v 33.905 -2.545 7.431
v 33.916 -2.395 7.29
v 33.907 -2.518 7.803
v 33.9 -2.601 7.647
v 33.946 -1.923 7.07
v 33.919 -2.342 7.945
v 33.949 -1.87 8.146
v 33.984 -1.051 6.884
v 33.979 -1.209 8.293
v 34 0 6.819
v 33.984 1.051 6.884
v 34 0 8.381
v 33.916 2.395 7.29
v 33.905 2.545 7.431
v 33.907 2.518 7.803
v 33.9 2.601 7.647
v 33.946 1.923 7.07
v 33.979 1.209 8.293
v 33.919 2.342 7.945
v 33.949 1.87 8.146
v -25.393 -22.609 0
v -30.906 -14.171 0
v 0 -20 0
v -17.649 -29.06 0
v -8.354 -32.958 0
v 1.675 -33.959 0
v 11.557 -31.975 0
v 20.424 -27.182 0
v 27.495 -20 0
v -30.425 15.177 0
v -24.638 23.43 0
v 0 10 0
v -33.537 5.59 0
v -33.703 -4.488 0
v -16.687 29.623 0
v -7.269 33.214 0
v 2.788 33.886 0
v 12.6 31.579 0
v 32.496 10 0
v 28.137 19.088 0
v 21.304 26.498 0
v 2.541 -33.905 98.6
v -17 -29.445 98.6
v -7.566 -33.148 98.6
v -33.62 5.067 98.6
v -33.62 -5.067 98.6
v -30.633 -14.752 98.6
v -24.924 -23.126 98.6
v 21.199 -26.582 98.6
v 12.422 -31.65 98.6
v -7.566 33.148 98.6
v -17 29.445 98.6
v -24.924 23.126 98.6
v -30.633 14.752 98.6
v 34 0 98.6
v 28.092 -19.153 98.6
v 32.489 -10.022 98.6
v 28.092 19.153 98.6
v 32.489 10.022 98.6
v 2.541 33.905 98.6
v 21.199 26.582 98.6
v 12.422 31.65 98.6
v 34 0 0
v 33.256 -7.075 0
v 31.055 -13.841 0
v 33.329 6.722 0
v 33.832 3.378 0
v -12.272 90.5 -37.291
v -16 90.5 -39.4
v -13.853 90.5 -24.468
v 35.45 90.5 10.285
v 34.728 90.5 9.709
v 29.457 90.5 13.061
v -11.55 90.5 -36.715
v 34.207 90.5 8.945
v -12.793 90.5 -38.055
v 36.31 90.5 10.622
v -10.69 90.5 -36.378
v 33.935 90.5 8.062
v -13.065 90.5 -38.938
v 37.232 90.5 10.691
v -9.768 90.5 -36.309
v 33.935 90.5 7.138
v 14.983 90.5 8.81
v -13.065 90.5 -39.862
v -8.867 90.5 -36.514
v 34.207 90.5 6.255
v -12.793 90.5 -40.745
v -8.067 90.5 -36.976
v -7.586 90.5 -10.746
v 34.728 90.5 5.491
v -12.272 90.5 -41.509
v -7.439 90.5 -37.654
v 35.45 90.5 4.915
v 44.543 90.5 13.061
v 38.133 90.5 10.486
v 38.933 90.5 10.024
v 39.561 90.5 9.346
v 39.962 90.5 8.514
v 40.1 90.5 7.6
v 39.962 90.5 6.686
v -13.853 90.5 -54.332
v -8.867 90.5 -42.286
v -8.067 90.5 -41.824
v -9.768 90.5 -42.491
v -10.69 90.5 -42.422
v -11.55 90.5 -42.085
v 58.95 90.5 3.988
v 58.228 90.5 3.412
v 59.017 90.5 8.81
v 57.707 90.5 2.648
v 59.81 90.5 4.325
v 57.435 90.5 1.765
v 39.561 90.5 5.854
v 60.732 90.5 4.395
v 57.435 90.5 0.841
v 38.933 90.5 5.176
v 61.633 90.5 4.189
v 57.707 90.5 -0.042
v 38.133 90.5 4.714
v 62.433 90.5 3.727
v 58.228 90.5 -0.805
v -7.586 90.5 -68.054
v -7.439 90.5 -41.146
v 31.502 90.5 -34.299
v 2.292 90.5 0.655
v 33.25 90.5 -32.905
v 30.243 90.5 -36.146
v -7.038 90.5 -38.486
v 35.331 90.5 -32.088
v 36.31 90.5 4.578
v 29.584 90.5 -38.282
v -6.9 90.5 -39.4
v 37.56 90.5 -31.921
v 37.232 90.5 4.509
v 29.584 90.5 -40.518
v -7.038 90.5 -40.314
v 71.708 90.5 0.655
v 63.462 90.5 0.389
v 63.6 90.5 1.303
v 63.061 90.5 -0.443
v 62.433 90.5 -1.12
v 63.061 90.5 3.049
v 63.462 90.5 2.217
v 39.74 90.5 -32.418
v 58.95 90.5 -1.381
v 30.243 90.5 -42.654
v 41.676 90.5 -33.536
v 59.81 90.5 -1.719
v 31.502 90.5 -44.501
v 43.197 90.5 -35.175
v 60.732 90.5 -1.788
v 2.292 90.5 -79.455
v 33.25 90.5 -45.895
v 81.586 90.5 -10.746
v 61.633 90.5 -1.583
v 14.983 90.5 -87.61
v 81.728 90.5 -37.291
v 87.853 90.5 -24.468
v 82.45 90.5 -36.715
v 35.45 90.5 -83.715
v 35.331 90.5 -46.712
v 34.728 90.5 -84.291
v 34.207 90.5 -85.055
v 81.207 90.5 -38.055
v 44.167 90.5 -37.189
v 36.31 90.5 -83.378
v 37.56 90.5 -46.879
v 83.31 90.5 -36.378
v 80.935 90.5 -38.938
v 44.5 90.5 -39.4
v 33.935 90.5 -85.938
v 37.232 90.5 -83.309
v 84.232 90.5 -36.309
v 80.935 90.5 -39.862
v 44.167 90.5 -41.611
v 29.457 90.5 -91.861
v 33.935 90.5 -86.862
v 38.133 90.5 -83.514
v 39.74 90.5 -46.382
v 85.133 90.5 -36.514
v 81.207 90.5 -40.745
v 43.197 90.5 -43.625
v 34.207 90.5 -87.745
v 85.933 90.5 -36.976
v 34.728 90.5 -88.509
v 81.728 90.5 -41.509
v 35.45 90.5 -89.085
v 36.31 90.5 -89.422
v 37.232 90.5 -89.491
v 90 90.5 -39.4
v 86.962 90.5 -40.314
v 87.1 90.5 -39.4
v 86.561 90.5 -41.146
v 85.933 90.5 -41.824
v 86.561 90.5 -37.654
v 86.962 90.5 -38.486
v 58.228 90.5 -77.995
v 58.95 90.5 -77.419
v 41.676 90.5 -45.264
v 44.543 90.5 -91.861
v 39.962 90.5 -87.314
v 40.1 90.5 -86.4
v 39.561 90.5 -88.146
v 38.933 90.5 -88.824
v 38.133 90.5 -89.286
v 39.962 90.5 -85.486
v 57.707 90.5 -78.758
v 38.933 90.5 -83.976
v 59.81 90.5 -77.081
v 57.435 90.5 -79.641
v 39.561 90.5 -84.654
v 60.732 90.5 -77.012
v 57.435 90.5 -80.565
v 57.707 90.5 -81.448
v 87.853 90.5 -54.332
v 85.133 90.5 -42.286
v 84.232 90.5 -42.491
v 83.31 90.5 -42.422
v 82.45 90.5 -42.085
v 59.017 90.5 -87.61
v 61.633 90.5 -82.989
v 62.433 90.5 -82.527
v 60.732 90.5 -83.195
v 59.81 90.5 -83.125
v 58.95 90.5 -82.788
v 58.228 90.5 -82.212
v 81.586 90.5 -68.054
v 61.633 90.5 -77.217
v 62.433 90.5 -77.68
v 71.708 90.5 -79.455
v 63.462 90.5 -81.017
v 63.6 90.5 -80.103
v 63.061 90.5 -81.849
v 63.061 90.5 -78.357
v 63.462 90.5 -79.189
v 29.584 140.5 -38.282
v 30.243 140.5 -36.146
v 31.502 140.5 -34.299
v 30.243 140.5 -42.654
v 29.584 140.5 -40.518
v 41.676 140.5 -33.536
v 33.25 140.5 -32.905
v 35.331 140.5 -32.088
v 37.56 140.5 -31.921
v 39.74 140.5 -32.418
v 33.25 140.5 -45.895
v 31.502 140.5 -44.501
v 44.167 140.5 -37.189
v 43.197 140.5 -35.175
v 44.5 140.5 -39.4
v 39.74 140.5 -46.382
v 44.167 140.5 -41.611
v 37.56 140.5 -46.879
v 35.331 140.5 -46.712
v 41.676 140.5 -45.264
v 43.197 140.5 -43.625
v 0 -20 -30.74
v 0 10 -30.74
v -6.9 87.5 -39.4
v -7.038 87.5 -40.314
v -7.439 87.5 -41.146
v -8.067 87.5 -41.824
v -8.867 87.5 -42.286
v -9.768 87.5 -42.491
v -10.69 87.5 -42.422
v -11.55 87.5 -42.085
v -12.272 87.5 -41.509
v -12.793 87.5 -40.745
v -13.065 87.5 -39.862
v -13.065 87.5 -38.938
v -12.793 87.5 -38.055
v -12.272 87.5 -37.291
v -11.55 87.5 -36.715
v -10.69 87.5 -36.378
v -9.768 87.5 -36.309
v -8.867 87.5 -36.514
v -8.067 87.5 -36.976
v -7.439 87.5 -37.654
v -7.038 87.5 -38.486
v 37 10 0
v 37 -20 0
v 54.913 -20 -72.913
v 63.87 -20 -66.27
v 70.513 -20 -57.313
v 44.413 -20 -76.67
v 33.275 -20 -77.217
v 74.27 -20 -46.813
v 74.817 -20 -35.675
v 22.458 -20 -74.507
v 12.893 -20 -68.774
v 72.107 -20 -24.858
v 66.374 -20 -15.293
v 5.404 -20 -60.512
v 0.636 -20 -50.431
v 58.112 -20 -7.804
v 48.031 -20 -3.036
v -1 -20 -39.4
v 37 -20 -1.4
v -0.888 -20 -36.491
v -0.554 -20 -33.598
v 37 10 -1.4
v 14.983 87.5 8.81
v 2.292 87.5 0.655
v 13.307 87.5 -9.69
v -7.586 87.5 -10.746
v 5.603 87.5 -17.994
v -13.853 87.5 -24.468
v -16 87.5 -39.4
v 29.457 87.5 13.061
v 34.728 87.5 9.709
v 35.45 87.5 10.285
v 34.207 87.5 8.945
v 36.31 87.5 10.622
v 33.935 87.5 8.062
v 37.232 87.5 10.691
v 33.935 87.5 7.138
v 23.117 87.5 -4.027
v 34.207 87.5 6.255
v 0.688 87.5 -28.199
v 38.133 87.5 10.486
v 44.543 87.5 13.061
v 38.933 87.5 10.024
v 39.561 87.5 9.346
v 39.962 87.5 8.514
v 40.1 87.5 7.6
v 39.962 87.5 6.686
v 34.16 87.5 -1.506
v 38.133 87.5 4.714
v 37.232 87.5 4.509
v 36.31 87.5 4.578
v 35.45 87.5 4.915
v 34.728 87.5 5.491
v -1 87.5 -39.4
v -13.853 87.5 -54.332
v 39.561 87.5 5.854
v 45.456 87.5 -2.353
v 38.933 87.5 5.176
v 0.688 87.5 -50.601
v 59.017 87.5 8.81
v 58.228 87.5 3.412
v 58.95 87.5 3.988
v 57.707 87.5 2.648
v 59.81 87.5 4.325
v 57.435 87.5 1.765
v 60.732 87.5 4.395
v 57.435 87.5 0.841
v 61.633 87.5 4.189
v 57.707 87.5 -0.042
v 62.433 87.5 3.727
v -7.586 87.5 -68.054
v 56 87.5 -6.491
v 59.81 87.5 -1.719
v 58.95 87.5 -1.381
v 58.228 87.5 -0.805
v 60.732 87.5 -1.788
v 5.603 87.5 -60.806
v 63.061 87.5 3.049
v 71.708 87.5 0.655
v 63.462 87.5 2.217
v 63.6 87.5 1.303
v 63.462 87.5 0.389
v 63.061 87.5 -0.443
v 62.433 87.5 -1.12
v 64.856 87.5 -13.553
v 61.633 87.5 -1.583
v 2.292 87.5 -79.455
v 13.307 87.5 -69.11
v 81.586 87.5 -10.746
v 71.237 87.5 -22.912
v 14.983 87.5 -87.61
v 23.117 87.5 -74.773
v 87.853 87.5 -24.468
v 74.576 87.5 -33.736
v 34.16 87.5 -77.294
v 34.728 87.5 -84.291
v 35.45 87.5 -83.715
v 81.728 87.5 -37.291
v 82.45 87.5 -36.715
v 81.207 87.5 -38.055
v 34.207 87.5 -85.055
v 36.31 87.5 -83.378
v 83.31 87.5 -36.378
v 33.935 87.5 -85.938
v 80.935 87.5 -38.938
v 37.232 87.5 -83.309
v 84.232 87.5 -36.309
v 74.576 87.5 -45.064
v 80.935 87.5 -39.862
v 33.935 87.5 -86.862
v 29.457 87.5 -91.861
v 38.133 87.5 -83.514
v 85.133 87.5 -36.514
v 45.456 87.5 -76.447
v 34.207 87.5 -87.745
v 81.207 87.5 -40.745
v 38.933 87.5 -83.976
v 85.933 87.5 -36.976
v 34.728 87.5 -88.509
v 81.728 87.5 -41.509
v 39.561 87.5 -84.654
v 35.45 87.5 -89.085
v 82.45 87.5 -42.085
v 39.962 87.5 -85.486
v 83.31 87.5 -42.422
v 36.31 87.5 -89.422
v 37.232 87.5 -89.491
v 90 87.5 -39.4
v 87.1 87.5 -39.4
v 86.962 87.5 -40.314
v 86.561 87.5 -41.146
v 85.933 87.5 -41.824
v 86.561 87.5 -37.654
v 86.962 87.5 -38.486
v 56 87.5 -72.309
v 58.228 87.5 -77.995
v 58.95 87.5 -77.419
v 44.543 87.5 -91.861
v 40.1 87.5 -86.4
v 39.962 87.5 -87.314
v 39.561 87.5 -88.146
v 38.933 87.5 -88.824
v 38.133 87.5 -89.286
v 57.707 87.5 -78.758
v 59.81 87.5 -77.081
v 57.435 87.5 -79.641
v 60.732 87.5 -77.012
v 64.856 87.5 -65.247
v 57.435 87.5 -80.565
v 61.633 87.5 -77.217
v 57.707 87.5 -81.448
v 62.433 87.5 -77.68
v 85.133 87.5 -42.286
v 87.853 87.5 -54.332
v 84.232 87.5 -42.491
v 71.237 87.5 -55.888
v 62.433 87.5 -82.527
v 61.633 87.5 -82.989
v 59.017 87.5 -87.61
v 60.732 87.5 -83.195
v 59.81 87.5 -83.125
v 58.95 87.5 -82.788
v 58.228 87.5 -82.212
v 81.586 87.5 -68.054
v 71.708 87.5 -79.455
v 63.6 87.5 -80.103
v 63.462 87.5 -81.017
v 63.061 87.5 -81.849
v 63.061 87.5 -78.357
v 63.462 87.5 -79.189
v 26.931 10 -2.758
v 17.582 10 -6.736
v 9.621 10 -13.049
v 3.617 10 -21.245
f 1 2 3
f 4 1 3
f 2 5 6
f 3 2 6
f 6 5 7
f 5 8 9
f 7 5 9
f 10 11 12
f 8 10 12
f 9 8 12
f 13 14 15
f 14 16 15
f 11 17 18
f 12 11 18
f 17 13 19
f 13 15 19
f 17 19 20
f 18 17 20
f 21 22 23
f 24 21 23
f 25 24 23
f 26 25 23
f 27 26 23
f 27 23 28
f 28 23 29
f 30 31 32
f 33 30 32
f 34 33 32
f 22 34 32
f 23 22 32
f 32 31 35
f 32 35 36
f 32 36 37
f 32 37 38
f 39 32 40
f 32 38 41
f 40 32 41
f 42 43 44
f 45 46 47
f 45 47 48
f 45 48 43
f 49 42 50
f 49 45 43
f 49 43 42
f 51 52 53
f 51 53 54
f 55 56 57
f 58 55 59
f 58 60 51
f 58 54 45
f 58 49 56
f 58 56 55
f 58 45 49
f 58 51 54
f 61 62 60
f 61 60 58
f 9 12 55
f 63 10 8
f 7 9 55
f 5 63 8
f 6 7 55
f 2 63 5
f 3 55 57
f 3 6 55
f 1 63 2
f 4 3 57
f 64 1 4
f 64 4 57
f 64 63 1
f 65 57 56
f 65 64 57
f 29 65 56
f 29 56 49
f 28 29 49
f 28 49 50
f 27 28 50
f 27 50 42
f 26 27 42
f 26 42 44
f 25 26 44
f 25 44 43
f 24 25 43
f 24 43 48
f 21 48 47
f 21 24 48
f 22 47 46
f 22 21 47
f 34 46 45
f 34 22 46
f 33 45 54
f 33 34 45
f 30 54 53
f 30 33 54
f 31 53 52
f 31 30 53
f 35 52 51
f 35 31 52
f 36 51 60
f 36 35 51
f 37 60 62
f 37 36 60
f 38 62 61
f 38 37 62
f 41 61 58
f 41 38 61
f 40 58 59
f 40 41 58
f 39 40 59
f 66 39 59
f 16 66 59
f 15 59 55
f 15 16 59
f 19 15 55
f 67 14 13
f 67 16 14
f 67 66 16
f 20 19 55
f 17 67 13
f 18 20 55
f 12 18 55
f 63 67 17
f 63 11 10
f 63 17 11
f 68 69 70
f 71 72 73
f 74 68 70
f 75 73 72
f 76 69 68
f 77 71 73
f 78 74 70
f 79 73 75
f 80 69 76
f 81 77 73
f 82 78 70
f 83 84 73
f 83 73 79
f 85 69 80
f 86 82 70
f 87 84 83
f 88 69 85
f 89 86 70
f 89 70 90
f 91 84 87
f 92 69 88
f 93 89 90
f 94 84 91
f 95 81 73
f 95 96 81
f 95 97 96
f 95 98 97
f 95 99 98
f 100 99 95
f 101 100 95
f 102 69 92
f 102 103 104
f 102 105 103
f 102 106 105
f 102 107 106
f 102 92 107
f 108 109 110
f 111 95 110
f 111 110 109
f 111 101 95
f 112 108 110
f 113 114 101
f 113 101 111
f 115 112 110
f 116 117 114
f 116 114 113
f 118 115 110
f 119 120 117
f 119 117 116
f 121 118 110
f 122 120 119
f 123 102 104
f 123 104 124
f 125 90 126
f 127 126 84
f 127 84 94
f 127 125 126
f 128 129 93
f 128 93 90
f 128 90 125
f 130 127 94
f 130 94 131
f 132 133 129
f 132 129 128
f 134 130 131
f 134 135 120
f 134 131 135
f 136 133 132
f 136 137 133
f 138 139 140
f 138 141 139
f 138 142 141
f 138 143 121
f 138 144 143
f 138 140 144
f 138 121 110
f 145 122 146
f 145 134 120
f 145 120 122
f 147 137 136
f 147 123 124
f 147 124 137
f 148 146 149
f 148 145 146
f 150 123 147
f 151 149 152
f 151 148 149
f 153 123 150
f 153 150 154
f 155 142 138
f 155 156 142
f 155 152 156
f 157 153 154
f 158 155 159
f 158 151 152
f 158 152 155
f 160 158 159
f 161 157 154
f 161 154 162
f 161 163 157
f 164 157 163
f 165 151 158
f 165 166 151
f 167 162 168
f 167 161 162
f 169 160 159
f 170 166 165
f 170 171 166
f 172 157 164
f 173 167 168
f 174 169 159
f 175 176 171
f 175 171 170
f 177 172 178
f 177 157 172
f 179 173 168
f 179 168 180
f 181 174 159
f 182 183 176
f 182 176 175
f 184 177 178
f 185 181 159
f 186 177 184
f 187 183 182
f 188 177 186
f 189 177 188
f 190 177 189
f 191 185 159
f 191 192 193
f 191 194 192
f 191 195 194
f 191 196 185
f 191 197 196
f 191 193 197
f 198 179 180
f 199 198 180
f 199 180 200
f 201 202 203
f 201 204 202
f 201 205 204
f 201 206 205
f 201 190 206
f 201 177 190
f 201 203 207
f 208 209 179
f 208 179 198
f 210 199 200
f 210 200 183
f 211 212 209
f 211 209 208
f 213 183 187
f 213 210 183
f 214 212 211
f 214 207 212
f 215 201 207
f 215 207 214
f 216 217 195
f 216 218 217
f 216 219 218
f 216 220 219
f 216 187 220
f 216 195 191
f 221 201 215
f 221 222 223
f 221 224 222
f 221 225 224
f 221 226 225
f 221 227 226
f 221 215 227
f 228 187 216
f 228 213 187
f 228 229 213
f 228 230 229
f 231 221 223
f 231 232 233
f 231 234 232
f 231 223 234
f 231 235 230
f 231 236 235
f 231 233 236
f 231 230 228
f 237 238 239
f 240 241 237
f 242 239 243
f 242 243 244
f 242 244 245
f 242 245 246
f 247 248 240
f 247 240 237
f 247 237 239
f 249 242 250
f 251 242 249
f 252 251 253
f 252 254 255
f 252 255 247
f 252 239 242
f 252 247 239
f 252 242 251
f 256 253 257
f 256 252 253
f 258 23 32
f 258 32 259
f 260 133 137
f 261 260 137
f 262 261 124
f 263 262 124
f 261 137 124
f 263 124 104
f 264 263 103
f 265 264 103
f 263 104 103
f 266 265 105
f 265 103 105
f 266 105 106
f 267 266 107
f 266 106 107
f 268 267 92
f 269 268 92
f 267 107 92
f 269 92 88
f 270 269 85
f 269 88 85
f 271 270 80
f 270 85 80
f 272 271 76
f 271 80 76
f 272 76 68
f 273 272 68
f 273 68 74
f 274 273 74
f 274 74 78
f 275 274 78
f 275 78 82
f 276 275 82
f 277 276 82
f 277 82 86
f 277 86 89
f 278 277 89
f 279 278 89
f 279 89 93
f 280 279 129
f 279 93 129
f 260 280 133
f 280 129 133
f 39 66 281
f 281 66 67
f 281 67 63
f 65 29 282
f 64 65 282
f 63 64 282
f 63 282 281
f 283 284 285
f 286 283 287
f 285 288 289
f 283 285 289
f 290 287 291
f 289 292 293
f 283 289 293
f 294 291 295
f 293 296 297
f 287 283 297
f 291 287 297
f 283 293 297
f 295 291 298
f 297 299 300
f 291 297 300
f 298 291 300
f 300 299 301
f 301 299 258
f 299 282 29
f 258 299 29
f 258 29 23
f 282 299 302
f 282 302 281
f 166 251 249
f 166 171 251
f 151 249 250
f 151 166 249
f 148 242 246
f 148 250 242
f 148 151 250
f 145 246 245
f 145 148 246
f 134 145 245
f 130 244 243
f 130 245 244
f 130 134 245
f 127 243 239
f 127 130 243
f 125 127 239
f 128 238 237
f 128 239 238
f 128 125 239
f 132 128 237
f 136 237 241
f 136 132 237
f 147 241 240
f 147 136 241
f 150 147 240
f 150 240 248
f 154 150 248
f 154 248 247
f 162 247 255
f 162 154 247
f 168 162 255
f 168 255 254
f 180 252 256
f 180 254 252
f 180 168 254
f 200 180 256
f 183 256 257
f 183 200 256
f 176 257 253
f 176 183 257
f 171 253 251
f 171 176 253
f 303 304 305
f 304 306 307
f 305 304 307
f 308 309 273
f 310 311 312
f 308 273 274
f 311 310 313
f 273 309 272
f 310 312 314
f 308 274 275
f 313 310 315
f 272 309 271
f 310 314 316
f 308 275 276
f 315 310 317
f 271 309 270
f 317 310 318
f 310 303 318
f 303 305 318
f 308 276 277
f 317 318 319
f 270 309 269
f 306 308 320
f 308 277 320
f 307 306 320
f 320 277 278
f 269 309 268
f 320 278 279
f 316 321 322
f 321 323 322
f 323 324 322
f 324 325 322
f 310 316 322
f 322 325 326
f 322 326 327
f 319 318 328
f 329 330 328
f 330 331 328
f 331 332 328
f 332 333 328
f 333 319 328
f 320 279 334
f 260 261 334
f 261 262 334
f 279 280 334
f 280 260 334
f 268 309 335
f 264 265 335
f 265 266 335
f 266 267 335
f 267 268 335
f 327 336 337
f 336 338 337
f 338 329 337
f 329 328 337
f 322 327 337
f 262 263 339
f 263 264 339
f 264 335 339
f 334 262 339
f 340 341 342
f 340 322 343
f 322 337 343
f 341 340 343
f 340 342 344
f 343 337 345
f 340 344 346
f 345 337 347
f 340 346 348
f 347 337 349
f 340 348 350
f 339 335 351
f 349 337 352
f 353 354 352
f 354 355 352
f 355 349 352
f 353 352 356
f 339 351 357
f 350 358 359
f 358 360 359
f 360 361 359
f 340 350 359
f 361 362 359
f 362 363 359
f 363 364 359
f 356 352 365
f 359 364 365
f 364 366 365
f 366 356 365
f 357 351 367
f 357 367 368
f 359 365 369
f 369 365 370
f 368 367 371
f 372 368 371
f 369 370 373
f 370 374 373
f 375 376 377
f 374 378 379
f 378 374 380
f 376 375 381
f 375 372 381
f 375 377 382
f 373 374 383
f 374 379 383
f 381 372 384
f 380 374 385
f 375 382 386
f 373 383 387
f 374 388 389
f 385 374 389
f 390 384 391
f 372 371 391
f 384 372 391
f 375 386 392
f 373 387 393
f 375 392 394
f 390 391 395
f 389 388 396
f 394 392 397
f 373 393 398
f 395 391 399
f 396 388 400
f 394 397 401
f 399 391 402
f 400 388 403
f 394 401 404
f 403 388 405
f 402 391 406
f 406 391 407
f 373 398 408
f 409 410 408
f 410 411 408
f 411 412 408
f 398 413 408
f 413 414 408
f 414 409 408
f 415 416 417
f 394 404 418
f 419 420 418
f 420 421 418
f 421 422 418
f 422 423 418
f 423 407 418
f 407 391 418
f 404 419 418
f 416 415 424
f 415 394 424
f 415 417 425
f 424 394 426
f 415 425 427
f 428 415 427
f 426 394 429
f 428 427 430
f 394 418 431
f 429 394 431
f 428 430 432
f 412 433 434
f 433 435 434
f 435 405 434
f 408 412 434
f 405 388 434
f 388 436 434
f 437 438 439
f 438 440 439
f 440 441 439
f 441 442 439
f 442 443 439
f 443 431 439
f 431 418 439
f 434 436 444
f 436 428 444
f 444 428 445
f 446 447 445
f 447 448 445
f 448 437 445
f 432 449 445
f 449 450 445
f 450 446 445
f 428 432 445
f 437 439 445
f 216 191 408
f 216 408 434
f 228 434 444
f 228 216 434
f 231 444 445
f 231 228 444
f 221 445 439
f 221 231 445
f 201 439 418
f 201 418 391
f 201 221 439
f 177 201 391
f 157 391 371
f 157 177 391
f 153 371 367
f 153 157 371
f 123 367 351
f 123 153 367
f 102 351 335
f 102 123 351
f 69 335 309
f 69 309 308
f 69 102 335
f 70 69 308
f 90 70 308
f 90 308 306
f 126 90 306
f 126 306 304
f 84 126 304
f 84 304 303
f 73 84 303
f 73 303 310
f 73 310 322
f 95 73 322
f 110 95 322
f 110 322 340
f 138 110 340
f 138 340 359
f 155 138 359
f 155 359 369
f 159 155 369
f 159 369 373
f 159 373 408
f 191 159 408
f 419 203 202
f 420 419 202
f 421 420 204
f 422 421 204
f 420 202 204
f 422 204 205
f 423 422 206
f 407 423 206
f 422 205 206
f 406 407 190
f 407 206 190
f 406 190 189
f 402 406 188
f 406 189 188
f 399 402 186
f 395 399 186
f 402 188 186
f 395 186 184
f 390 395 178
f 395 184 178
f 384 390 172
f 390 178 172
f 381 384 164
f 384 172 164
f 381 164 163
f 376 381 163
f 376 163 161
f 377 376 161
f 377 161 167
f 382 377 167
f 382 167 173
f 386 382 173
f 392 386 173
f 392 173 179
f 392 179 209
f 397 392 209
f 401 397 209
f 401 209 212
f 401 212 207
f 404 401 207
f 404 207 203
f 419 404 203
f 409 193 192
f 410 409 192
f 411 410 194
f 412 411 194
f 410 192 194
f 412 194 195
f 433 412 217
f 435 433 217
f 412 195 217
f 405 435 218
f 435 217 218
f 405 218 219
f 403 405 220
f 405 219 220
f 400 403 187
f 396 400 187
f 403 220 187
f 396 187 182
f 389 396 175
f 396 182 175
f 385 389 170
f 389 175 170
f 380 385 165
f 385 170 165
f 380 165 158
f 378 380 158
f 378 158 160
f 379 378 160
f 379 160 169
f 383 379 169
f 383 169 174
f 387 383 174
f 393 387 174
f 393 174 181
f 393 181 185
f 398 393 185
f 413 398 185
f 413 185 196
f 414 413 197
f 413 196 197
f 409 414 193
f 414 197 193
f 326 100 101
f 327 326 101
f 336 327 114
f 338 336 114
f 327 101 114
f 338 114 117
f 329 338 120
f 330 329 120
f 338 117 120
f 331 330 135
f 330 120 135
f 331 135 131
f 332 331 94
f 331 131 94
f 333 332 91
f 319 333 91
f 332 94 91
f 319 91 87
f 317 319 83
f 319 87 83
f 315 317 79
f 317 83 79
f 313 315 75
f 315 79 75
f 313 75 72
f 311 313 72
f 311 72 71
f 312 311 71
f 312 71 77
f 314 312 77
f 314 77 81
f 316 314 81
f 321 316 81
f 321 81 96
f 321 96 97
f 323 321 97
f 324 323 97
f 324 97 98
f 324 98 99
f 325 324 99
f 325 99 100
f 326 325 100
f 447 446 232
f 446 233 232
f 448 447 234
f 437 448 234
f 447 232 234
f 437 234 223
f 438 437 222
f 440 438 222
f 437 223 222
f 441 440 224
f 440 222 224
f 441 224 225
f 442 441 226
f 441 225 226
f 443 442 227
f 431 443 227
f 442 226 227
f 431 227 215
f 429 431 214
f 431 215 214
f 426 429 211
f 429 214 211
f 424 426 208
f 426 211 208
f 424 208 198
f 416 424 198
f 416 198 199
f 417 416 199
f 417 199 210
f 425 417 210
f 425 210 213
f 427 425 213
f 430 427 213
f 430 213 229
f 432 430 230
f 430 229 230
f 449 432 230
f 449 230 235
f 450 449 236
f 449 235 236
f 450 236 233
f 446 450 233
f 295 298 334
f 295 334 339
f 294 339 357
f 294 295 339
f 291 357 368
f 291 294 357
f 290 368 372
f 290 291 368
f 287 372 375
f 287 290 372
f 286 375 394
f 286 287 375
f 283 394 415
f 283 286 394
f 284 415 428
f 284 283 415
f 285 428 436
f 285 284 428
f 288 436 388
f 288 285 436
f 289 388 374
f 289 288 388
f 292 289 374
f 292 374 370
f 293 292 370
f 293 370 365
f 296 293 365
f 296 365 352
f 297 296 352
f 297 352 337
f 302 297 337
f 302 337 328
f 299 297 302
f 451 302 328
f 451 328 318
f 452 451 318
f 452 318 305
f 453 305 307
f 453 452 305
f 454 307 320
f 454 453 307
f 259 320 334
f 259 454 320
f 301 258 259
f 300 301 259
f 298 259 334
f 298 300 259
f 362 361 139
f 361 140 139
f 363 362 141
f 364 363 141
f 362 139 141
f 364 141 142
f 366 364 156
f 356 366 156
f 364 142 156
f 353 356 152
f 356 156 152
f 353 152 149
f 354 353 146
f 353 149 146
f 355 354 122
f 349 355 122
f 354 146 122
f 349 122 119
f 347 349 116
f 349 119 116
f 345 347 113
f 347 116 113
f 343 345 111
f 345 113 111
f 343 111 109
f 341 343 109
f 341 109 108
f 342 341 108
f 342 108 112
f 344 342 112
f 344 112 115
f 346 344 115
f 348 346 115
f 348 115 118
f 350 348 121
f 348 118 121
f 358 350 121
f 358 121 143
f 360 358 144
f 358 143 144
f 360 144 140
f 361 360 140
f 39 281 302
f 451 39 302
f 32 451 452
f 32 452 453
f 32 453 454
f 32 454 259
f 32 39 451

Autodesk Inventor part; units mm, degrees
ref_plane "YZ Plane" through (0, 0, 0) normal (1, 0, 0) x (0, 1, 0)
ref_plane "XZ Plane" through (0, 0, 0) normal (0, 1, 0) x (-1, 0, 0)
ref_plane "XY Plane" through (0, 0, 0) normal (0, 0, 1) x (1, 0, 0)
sketch "Sketch1" plane through (0, 0, 0) normal (0, 0, 1) x (1, 0, 0)
  circle A0 centre (0, 0) radius 34
  dimension "d0" = 68
extrude "Extrusion1" add sketch "Sketch1" along normal blind 98.6
sketch "Sketch2" plane through (0, 0, 0) normal (0, 1, 0) x (-1, 0, 0)
  circle A0 centre (-37, -39.4) radius 38
  line L0 (34, 98.6) -> (-34, 98.6) projected
  point P0 (0, 0)
  dimension "d3" = 76
  dimension "d4" = 138
  dimension "d5" = 37
extrude "Extrusion2" add sketch "Sketch2" along normal blind 90.5 and the other way blind 20
sketch "Sketch3" plane through (37, 90.5, -39.4) normal (0, 1, 0) x (1, 0, 0)
  circle A0 centre (0, 0) radius 53
  circle A1 centre (0, 0) radius 38 projected
  point P0 (-37, -39.4)
  dimension "d10" = 106
extrude "Extrusion3" add sketch "Sketch3" against normal blind 3
sketch "Sketch4" plane through (0, 0, 0) normal (0, 1, 0) x (-1, 0, 0)
  circle A0 centre (-37, -39.4) radius 38 projected
  line L0 (0, 0) -> (-37, 0)
  line L1 (-34, 0) -> (34, 0) projected
  line L2 (0, 0) -> (0, -39.4)
  line L3 (0, -39.4) -> (-37, -39.4)
  line L4 (-37, -39.4) -> (-37, 0)
extrude "Extrusion4" add sketch "Sketch4" along normal blind 10 and the other way blind 20 contours L2 L3 L4 A0 | A0 L4 L0 L2 picked at (-12.3333, -36.5132)
sketch "Sketch5" plane through (37, 90.5, -39.4) normal (0, 1, 0) x (1, 0, 0)
  circle A0 centre (0, 0) radius 53 construction
  circle A1 centre (0, 0) radius 7.5
  point P0 (-37, -39.4)
  dimension "d17" = 15
extrude "Extrusion5" add sketch "Sketch5" along normal blind 50
sketch "Sketch6" plane through (37, 90.5, -39.4) normal (0, 1, 0) x (1, 0, 0)
  circle A0 centre (0, 0) radius 53 construction
  circle A1 centre (23.5, 40.7032) radius 3.1
  line L0 (0, 0) -> (0, 53) construction
  line L1 (0, 0) -> (23.5, 40.7032) construction
  circle A2 centre (-47, 0) radius 3.1
  circle A3 centre (23.5, -40.7032) radius 3.1
  circle A4 centre (0, 47) radius 3.1
  circle A5 centre (-47, 0) radius 3.1
  circle A6 centre (0, -47) radius 3.1
  circle A7 centre (47, 0) radius 3.1
  point P0 (-37, -39.4)
  dimension "d20" = 6.2
  dimension "d21" = 47
  dimension "d22" = 30
  dimension "d25" = 360
  dimension "d27" = 6.2
  dimension "d28" = 47
  dimension "d31" = 360
extrude "Extrusion6" cut sketch "Sketch6" against normal through all
properties part number "PN00113-6" material "ABS Plastic"
